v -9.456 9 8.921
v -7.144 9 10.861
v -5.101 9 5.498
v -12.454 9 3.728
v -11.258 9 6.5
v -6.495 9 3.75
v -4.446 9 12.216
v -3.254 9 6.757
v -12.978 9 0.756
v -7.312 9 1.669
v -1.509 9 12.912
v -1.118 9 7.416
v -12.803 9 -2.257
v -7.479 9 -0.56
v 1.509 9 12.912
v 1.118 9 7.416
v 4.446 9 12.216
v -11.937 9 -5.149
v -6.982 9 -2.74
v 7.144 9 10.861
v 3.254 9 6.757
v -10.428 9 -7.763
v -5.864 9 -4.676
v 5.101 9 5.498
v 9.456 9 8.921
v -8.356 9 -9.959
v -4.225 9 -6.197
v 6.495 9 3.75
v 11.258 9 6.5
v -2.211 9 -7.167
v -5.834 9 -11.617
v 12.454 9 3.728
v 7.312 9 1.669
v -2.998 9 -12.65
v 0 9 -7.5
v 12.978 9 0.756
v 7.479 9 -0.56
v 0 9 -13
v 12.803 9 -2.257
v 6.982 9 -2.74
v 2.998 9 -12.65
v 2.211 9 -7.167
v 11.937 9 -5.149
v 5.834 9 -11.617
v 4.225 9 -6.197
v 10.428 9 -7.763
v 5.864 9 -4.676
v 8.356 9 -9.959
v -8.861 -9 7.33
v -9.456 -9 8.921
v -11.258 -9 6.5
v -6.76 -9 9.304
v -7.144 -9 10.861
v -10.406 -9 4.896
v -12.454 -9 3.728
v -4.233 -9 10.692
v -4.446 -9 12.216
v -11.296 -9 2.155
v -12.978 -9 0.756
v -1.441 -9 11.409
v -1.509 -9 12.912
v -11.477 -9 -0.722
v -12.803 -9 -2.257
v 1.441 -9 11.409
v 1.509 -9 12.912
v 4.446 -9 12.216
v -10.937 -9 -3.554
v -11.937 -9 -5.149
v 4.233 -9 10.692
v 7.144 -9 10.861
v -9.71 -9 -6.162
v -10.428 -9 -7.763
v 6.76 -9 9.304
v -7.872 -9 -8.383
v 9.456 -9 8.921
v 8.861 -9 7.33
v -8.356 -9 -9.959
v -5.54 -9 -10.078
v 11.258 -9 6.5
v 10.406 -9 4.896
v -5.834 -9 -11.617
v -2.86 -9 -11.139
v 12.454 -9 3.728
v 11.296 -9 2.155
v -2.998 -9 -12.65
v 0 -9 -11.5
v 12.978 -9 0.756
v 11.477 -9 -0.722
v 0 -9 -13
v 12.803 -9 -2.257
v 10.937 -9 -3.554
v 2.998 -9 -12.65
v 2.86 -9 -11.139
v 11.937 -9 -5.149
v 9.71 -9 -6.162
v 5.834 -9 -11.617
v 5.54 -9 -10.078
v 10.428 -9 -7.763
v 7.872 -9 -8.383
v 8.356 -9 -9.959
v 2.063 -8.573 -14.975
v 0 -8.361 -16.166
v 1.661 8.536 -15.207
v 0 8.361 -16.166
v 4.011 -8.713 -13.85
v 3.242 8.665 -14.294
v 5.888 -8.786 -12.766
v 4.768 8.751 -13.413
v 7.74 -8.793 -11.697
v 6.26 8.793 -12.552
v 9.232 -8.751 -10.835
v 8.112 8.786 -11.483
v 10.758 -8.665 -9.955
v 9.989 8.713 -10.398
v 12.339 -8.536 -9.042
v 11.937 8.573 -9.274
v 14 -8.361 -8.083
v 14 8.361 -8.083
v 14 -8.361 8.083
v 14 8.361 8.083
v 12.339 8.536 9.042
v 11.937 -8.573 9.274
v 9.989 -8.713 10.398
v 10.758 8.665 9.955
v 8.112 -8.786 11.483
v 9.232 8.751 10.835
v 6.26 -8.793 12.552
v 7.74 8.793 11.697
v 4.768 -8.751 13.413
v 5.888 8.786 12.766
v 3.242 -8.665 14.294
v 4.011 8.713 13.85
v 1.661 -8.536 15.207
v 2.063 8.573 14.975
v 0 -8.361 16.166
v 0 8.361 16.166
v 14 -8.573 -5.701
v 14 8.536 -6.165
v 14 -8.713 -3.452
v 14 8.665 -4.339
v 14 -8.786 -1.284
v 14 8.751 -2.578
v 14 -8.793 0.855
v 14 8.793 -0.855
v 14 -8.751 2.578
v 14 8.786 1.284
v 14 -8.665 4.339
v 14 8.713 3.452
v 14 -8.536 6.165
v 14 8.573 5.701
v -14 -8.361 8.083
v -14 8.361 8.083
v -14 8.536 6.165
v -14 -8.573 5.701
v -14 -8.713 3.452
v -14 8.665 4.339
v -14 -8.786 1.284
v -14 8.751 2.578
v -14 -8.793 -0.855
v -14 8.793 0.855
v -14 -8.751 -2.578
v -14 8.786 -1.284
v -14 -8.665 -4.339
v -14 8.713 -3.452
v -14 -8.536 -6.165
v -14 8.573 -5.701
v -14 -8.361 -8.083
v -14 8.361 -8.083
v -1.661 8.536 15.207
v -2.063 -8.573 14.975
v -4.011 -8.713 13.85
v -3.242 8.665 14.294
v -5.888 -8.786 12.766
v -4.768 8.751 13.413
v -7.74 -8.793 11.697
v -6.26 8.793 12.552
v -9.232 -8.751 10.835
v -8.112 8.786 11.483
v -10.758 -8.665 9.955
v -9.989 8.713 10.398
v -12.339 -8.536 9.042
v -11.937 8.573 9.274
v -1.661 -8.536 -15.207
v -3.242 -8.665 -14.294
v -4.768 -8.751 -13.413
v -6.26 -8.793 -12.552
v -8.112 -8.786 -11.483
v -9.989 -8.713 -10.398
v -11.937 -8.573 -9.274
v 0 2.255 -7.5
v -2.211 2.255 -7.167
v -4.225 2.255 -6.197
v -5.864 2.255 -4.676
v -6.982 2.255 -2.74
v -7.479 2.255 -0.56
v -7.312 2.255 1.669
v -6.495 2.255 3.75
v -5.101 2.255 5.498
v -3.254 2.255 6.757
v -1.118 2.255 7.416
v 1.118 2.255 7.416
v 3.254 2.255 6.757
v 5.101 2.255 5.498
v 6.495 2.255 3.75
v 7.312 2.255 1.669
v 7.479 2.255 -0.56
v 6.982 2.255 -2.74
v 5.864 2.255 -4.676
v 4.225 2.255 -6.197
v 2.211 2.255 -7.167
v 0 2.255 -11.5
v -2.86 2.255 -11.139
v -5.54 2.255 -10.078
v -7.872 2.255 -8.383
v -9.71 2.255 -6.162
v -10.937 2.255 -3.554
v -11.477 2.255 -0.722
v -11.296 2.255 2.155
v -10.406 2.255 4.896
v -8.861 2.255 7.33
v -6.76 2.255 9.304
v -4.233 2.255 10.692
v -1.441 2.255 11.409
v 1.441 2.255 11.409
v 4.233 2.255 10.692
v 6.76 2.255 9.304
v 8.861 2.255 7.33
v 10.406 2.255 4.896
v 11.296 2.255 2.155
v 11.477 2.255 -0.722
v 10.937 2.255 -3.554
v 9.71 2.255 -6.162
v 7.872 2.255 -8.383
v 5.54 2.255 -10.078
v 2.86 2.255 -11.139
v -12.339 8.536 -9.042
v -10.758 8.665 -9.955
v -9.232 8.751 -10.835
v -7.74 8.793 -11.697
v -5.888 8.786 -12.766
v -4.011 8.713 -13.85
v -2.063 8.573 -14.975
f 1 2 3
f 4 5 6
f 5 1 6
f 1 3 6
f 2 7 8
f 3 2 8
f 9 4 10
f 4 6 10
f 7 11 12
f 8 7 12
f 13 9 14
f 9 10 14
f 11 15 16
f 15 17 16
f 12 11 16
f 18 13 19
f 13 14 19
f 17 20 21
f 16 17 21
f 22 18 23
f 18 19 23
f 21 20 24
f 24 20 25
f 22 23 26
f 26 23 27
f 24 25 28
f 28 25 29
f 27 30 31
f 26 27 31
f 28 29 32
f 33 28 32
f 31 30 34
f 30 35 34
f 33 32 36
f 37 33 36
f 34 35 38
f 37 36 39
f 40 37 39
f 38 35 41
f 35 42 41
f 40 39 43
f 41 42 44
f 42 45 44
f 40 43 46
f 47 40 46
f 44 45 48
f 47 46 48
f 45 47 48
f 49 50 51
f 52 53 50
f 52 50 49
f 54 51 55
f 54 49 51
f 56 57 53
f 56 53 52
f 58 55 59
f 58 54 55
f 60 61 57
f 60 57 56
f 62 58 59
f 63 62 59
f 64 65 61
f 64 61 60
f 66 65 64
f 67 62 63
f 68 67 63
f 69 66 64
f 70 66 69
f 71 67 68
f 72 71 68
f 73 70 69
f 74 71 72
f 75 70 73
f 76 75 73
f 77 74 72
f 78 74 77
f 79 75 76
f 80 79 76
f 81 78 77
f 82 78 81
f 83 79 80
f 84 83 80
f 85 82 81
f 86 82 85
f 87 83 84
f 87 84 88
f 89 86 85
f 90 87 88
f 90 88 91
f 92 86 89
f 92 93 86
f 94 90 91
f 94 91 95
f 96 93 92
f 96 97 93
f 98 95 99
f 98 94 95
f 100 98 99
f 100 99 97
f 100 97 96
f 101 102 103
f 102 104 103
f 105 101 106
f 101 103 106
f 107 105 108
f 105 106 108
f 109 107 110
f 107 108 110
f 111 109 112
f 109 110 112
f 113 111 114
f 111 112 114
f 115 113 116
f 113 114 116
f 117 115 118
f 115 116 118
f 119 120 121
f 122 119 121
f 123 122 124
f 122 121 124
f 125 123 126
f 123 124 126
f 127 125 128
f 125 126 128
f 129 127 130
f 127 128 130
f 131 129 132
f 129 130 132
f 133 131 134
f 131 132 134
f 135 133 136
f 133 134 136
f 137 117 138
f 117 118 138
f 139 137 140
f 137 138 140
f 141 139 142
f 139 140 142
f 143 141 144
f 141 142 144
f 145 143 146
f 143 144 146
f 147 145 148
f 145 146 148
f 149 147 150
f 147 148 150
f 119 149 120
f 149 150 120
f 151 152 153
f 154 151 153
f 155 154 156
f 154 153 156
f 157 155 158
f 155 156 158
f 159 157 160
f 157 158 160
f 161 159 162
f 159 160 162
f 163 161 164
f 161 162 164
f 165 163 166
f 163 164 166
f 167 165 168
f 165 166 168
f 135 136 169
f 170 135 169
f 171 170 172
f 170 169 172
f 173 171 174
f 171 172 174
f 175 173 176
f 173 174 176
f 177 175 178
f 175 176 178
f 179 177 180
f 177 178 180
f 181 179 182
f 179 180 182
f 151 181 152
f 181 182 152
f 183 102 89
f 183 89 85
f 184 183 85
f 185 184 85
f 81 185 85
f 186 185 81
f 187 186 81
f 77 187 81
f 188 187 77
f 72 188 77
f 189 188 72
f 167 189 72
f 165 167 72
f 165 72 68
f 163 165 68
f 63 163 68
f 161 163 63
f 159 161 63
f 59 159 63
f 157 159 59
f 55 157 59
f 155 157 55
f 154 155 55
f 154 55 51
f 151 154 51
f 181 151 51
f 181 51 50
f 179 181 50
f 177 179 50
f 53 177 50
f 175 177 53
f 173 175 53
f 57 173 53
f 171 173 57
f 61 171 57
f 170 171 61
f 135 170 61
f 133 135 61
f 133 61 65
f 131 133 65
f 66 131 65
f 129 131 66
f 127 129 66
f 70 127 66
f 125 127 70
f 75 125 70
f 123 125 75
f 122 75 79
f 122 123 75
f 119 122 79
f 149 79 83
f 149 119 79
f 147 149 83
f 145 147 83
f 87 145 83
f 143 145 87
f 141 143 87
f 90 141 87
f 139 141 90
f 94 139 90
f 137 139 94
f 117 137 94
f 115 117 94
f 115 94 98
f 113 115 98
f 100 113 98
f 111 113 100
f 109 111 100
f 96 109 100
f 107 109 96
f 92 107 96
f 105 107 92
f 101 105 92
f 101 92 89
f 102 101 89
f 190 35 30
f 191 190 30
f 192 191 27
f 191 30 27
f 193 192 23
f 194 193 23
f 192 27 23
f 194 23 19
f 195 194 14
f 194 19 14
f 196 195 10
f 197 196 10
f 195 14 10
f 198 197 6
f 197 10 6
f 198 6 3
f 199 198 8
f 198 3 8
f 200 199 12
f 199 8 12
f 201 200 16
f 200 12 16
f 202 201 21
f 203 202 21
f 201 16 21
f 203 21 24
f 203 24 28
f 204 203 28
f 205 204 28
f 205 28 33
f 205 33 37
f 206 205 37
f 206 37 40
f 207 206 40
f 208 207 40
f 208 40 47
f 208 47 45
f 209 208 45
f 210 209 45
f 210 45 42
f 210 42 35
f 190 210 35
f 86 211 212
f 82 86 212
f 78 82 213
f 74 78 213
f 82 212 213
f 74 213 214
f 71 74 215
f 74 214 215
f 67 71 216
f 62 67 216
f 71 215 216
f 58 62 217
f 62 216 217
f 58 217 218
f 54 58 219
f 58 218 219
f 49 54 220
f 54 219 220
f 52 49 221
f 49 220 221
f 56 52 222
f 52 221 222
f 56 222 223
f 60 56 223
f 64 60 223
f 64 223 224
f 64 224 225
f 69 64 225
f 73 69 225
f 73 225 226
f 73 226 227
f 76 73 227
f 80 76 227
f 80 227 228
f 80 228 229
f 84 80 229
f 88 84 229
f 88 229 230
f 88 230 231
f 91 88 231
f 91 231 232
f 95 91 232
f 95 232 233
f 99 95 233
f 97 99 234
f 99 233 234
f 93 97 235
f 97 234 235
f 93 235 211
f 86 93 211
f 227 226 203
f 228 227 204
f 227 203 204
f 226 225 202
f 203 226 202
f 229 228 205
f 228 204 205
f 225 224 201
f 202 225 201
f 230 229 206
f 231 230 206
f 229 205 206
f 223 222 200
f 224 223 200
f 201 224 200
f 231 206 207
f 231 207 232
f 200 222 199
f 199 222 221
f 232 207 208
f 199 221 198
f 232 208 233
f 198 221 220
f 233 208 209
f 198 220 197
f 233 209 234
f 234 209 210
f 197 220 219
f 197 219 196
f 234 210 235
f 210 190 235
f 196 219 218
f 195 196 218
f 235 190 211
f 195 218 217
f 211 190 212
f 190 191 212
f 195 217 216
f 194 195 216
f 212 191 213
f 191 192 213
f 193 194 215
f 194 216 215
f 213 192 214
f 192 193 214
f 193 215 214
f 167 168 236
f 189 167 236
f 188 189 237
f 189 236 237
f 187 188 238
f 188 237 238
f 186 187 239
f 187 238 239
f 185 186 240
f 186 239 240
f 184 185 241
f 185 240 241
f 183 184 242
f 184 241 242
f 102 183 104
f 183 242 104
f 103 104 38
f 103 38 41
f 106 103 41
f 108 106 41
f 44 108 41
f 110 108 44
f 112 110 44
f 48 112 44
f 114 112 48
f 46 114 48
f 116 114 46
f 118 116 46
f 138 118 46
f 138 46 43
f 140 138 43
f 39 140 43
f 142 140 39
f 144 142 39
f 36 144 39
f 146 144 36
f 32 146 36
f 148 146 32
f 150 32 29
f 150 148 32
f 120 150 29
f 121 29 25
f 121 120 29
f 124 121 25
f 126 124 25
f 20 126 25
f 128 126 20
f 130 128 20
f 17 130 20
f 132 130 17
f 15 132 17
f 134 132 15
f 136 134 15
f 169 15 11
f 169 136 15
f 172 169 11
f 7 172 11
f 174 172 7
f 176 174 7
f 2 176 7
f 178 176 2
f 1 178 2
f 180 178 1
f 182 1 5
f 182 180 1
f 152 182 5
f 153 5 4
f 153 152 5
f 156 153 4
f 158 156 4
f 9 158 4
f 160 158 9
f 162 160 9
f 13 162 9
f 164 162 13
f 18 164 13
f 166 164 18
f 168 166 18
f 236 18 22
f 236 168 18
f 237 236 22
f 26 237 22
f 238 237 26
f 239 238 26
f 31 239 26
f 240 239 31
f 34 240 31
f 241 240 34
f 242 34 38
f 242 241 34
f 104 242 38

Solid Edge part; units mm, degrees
sketch "Sketch1" plane through (0, 0, 0) normal (0, -1, 0) x (1, 0, 0)
  line L0 (0, -16.1658) -> (14, -8.0829)
  line L1 (14, -8.0829) -> (14, 8.0829)
  line L2 (14, 8.0829) -> (0, 16.1658)
  line L3 (0, 16.1658) -> (-14, 8.0829)
  line L4 (-14, 8.0829) -> (-14, -8.0829)
  line L5 (-14, -8.0829) -> (0, -16.1658)
  dimension "D1" = 28
extrude "Protrusion1" add sketch "Sketch1" along normal mid plane 18
sketch "Sketch2" plane through (0, 0, 0) normal (1, 0, 0) x (0, 1, 0)
  line L0 (9, -13) -> (7.6451, -19.7097)
revolve "RevolvedCutout1" cut sketch "Sketch2" angle 360 about axis through (0, -63.5, 0) along (0, 1, 0) material side at (0, 8.3716, -16.3647)
mirror "Mirror1" about plane through (0, 0, 0) normal (0, -1, 0) of "RevolvedCutout1"
sketch "Sketch3" plane through (0, 0, 0) normal (1, 0, 0) x (0, 1, 0)
  line L0 (-9, -11.5) -> (2.2546, -11.5)
  line L1 (2.2546, -11.5) -> (2.2546, -7.5)
  line L2 (2.2546, -7.5) -> (9, -7.5)
revolve "RevolvedCutout3" cut sketch "Sketch3" angle 360 about axis through (0, -63.5, 0) along (0, 1, 0) material side at (0, -3.3727, -11.45)
